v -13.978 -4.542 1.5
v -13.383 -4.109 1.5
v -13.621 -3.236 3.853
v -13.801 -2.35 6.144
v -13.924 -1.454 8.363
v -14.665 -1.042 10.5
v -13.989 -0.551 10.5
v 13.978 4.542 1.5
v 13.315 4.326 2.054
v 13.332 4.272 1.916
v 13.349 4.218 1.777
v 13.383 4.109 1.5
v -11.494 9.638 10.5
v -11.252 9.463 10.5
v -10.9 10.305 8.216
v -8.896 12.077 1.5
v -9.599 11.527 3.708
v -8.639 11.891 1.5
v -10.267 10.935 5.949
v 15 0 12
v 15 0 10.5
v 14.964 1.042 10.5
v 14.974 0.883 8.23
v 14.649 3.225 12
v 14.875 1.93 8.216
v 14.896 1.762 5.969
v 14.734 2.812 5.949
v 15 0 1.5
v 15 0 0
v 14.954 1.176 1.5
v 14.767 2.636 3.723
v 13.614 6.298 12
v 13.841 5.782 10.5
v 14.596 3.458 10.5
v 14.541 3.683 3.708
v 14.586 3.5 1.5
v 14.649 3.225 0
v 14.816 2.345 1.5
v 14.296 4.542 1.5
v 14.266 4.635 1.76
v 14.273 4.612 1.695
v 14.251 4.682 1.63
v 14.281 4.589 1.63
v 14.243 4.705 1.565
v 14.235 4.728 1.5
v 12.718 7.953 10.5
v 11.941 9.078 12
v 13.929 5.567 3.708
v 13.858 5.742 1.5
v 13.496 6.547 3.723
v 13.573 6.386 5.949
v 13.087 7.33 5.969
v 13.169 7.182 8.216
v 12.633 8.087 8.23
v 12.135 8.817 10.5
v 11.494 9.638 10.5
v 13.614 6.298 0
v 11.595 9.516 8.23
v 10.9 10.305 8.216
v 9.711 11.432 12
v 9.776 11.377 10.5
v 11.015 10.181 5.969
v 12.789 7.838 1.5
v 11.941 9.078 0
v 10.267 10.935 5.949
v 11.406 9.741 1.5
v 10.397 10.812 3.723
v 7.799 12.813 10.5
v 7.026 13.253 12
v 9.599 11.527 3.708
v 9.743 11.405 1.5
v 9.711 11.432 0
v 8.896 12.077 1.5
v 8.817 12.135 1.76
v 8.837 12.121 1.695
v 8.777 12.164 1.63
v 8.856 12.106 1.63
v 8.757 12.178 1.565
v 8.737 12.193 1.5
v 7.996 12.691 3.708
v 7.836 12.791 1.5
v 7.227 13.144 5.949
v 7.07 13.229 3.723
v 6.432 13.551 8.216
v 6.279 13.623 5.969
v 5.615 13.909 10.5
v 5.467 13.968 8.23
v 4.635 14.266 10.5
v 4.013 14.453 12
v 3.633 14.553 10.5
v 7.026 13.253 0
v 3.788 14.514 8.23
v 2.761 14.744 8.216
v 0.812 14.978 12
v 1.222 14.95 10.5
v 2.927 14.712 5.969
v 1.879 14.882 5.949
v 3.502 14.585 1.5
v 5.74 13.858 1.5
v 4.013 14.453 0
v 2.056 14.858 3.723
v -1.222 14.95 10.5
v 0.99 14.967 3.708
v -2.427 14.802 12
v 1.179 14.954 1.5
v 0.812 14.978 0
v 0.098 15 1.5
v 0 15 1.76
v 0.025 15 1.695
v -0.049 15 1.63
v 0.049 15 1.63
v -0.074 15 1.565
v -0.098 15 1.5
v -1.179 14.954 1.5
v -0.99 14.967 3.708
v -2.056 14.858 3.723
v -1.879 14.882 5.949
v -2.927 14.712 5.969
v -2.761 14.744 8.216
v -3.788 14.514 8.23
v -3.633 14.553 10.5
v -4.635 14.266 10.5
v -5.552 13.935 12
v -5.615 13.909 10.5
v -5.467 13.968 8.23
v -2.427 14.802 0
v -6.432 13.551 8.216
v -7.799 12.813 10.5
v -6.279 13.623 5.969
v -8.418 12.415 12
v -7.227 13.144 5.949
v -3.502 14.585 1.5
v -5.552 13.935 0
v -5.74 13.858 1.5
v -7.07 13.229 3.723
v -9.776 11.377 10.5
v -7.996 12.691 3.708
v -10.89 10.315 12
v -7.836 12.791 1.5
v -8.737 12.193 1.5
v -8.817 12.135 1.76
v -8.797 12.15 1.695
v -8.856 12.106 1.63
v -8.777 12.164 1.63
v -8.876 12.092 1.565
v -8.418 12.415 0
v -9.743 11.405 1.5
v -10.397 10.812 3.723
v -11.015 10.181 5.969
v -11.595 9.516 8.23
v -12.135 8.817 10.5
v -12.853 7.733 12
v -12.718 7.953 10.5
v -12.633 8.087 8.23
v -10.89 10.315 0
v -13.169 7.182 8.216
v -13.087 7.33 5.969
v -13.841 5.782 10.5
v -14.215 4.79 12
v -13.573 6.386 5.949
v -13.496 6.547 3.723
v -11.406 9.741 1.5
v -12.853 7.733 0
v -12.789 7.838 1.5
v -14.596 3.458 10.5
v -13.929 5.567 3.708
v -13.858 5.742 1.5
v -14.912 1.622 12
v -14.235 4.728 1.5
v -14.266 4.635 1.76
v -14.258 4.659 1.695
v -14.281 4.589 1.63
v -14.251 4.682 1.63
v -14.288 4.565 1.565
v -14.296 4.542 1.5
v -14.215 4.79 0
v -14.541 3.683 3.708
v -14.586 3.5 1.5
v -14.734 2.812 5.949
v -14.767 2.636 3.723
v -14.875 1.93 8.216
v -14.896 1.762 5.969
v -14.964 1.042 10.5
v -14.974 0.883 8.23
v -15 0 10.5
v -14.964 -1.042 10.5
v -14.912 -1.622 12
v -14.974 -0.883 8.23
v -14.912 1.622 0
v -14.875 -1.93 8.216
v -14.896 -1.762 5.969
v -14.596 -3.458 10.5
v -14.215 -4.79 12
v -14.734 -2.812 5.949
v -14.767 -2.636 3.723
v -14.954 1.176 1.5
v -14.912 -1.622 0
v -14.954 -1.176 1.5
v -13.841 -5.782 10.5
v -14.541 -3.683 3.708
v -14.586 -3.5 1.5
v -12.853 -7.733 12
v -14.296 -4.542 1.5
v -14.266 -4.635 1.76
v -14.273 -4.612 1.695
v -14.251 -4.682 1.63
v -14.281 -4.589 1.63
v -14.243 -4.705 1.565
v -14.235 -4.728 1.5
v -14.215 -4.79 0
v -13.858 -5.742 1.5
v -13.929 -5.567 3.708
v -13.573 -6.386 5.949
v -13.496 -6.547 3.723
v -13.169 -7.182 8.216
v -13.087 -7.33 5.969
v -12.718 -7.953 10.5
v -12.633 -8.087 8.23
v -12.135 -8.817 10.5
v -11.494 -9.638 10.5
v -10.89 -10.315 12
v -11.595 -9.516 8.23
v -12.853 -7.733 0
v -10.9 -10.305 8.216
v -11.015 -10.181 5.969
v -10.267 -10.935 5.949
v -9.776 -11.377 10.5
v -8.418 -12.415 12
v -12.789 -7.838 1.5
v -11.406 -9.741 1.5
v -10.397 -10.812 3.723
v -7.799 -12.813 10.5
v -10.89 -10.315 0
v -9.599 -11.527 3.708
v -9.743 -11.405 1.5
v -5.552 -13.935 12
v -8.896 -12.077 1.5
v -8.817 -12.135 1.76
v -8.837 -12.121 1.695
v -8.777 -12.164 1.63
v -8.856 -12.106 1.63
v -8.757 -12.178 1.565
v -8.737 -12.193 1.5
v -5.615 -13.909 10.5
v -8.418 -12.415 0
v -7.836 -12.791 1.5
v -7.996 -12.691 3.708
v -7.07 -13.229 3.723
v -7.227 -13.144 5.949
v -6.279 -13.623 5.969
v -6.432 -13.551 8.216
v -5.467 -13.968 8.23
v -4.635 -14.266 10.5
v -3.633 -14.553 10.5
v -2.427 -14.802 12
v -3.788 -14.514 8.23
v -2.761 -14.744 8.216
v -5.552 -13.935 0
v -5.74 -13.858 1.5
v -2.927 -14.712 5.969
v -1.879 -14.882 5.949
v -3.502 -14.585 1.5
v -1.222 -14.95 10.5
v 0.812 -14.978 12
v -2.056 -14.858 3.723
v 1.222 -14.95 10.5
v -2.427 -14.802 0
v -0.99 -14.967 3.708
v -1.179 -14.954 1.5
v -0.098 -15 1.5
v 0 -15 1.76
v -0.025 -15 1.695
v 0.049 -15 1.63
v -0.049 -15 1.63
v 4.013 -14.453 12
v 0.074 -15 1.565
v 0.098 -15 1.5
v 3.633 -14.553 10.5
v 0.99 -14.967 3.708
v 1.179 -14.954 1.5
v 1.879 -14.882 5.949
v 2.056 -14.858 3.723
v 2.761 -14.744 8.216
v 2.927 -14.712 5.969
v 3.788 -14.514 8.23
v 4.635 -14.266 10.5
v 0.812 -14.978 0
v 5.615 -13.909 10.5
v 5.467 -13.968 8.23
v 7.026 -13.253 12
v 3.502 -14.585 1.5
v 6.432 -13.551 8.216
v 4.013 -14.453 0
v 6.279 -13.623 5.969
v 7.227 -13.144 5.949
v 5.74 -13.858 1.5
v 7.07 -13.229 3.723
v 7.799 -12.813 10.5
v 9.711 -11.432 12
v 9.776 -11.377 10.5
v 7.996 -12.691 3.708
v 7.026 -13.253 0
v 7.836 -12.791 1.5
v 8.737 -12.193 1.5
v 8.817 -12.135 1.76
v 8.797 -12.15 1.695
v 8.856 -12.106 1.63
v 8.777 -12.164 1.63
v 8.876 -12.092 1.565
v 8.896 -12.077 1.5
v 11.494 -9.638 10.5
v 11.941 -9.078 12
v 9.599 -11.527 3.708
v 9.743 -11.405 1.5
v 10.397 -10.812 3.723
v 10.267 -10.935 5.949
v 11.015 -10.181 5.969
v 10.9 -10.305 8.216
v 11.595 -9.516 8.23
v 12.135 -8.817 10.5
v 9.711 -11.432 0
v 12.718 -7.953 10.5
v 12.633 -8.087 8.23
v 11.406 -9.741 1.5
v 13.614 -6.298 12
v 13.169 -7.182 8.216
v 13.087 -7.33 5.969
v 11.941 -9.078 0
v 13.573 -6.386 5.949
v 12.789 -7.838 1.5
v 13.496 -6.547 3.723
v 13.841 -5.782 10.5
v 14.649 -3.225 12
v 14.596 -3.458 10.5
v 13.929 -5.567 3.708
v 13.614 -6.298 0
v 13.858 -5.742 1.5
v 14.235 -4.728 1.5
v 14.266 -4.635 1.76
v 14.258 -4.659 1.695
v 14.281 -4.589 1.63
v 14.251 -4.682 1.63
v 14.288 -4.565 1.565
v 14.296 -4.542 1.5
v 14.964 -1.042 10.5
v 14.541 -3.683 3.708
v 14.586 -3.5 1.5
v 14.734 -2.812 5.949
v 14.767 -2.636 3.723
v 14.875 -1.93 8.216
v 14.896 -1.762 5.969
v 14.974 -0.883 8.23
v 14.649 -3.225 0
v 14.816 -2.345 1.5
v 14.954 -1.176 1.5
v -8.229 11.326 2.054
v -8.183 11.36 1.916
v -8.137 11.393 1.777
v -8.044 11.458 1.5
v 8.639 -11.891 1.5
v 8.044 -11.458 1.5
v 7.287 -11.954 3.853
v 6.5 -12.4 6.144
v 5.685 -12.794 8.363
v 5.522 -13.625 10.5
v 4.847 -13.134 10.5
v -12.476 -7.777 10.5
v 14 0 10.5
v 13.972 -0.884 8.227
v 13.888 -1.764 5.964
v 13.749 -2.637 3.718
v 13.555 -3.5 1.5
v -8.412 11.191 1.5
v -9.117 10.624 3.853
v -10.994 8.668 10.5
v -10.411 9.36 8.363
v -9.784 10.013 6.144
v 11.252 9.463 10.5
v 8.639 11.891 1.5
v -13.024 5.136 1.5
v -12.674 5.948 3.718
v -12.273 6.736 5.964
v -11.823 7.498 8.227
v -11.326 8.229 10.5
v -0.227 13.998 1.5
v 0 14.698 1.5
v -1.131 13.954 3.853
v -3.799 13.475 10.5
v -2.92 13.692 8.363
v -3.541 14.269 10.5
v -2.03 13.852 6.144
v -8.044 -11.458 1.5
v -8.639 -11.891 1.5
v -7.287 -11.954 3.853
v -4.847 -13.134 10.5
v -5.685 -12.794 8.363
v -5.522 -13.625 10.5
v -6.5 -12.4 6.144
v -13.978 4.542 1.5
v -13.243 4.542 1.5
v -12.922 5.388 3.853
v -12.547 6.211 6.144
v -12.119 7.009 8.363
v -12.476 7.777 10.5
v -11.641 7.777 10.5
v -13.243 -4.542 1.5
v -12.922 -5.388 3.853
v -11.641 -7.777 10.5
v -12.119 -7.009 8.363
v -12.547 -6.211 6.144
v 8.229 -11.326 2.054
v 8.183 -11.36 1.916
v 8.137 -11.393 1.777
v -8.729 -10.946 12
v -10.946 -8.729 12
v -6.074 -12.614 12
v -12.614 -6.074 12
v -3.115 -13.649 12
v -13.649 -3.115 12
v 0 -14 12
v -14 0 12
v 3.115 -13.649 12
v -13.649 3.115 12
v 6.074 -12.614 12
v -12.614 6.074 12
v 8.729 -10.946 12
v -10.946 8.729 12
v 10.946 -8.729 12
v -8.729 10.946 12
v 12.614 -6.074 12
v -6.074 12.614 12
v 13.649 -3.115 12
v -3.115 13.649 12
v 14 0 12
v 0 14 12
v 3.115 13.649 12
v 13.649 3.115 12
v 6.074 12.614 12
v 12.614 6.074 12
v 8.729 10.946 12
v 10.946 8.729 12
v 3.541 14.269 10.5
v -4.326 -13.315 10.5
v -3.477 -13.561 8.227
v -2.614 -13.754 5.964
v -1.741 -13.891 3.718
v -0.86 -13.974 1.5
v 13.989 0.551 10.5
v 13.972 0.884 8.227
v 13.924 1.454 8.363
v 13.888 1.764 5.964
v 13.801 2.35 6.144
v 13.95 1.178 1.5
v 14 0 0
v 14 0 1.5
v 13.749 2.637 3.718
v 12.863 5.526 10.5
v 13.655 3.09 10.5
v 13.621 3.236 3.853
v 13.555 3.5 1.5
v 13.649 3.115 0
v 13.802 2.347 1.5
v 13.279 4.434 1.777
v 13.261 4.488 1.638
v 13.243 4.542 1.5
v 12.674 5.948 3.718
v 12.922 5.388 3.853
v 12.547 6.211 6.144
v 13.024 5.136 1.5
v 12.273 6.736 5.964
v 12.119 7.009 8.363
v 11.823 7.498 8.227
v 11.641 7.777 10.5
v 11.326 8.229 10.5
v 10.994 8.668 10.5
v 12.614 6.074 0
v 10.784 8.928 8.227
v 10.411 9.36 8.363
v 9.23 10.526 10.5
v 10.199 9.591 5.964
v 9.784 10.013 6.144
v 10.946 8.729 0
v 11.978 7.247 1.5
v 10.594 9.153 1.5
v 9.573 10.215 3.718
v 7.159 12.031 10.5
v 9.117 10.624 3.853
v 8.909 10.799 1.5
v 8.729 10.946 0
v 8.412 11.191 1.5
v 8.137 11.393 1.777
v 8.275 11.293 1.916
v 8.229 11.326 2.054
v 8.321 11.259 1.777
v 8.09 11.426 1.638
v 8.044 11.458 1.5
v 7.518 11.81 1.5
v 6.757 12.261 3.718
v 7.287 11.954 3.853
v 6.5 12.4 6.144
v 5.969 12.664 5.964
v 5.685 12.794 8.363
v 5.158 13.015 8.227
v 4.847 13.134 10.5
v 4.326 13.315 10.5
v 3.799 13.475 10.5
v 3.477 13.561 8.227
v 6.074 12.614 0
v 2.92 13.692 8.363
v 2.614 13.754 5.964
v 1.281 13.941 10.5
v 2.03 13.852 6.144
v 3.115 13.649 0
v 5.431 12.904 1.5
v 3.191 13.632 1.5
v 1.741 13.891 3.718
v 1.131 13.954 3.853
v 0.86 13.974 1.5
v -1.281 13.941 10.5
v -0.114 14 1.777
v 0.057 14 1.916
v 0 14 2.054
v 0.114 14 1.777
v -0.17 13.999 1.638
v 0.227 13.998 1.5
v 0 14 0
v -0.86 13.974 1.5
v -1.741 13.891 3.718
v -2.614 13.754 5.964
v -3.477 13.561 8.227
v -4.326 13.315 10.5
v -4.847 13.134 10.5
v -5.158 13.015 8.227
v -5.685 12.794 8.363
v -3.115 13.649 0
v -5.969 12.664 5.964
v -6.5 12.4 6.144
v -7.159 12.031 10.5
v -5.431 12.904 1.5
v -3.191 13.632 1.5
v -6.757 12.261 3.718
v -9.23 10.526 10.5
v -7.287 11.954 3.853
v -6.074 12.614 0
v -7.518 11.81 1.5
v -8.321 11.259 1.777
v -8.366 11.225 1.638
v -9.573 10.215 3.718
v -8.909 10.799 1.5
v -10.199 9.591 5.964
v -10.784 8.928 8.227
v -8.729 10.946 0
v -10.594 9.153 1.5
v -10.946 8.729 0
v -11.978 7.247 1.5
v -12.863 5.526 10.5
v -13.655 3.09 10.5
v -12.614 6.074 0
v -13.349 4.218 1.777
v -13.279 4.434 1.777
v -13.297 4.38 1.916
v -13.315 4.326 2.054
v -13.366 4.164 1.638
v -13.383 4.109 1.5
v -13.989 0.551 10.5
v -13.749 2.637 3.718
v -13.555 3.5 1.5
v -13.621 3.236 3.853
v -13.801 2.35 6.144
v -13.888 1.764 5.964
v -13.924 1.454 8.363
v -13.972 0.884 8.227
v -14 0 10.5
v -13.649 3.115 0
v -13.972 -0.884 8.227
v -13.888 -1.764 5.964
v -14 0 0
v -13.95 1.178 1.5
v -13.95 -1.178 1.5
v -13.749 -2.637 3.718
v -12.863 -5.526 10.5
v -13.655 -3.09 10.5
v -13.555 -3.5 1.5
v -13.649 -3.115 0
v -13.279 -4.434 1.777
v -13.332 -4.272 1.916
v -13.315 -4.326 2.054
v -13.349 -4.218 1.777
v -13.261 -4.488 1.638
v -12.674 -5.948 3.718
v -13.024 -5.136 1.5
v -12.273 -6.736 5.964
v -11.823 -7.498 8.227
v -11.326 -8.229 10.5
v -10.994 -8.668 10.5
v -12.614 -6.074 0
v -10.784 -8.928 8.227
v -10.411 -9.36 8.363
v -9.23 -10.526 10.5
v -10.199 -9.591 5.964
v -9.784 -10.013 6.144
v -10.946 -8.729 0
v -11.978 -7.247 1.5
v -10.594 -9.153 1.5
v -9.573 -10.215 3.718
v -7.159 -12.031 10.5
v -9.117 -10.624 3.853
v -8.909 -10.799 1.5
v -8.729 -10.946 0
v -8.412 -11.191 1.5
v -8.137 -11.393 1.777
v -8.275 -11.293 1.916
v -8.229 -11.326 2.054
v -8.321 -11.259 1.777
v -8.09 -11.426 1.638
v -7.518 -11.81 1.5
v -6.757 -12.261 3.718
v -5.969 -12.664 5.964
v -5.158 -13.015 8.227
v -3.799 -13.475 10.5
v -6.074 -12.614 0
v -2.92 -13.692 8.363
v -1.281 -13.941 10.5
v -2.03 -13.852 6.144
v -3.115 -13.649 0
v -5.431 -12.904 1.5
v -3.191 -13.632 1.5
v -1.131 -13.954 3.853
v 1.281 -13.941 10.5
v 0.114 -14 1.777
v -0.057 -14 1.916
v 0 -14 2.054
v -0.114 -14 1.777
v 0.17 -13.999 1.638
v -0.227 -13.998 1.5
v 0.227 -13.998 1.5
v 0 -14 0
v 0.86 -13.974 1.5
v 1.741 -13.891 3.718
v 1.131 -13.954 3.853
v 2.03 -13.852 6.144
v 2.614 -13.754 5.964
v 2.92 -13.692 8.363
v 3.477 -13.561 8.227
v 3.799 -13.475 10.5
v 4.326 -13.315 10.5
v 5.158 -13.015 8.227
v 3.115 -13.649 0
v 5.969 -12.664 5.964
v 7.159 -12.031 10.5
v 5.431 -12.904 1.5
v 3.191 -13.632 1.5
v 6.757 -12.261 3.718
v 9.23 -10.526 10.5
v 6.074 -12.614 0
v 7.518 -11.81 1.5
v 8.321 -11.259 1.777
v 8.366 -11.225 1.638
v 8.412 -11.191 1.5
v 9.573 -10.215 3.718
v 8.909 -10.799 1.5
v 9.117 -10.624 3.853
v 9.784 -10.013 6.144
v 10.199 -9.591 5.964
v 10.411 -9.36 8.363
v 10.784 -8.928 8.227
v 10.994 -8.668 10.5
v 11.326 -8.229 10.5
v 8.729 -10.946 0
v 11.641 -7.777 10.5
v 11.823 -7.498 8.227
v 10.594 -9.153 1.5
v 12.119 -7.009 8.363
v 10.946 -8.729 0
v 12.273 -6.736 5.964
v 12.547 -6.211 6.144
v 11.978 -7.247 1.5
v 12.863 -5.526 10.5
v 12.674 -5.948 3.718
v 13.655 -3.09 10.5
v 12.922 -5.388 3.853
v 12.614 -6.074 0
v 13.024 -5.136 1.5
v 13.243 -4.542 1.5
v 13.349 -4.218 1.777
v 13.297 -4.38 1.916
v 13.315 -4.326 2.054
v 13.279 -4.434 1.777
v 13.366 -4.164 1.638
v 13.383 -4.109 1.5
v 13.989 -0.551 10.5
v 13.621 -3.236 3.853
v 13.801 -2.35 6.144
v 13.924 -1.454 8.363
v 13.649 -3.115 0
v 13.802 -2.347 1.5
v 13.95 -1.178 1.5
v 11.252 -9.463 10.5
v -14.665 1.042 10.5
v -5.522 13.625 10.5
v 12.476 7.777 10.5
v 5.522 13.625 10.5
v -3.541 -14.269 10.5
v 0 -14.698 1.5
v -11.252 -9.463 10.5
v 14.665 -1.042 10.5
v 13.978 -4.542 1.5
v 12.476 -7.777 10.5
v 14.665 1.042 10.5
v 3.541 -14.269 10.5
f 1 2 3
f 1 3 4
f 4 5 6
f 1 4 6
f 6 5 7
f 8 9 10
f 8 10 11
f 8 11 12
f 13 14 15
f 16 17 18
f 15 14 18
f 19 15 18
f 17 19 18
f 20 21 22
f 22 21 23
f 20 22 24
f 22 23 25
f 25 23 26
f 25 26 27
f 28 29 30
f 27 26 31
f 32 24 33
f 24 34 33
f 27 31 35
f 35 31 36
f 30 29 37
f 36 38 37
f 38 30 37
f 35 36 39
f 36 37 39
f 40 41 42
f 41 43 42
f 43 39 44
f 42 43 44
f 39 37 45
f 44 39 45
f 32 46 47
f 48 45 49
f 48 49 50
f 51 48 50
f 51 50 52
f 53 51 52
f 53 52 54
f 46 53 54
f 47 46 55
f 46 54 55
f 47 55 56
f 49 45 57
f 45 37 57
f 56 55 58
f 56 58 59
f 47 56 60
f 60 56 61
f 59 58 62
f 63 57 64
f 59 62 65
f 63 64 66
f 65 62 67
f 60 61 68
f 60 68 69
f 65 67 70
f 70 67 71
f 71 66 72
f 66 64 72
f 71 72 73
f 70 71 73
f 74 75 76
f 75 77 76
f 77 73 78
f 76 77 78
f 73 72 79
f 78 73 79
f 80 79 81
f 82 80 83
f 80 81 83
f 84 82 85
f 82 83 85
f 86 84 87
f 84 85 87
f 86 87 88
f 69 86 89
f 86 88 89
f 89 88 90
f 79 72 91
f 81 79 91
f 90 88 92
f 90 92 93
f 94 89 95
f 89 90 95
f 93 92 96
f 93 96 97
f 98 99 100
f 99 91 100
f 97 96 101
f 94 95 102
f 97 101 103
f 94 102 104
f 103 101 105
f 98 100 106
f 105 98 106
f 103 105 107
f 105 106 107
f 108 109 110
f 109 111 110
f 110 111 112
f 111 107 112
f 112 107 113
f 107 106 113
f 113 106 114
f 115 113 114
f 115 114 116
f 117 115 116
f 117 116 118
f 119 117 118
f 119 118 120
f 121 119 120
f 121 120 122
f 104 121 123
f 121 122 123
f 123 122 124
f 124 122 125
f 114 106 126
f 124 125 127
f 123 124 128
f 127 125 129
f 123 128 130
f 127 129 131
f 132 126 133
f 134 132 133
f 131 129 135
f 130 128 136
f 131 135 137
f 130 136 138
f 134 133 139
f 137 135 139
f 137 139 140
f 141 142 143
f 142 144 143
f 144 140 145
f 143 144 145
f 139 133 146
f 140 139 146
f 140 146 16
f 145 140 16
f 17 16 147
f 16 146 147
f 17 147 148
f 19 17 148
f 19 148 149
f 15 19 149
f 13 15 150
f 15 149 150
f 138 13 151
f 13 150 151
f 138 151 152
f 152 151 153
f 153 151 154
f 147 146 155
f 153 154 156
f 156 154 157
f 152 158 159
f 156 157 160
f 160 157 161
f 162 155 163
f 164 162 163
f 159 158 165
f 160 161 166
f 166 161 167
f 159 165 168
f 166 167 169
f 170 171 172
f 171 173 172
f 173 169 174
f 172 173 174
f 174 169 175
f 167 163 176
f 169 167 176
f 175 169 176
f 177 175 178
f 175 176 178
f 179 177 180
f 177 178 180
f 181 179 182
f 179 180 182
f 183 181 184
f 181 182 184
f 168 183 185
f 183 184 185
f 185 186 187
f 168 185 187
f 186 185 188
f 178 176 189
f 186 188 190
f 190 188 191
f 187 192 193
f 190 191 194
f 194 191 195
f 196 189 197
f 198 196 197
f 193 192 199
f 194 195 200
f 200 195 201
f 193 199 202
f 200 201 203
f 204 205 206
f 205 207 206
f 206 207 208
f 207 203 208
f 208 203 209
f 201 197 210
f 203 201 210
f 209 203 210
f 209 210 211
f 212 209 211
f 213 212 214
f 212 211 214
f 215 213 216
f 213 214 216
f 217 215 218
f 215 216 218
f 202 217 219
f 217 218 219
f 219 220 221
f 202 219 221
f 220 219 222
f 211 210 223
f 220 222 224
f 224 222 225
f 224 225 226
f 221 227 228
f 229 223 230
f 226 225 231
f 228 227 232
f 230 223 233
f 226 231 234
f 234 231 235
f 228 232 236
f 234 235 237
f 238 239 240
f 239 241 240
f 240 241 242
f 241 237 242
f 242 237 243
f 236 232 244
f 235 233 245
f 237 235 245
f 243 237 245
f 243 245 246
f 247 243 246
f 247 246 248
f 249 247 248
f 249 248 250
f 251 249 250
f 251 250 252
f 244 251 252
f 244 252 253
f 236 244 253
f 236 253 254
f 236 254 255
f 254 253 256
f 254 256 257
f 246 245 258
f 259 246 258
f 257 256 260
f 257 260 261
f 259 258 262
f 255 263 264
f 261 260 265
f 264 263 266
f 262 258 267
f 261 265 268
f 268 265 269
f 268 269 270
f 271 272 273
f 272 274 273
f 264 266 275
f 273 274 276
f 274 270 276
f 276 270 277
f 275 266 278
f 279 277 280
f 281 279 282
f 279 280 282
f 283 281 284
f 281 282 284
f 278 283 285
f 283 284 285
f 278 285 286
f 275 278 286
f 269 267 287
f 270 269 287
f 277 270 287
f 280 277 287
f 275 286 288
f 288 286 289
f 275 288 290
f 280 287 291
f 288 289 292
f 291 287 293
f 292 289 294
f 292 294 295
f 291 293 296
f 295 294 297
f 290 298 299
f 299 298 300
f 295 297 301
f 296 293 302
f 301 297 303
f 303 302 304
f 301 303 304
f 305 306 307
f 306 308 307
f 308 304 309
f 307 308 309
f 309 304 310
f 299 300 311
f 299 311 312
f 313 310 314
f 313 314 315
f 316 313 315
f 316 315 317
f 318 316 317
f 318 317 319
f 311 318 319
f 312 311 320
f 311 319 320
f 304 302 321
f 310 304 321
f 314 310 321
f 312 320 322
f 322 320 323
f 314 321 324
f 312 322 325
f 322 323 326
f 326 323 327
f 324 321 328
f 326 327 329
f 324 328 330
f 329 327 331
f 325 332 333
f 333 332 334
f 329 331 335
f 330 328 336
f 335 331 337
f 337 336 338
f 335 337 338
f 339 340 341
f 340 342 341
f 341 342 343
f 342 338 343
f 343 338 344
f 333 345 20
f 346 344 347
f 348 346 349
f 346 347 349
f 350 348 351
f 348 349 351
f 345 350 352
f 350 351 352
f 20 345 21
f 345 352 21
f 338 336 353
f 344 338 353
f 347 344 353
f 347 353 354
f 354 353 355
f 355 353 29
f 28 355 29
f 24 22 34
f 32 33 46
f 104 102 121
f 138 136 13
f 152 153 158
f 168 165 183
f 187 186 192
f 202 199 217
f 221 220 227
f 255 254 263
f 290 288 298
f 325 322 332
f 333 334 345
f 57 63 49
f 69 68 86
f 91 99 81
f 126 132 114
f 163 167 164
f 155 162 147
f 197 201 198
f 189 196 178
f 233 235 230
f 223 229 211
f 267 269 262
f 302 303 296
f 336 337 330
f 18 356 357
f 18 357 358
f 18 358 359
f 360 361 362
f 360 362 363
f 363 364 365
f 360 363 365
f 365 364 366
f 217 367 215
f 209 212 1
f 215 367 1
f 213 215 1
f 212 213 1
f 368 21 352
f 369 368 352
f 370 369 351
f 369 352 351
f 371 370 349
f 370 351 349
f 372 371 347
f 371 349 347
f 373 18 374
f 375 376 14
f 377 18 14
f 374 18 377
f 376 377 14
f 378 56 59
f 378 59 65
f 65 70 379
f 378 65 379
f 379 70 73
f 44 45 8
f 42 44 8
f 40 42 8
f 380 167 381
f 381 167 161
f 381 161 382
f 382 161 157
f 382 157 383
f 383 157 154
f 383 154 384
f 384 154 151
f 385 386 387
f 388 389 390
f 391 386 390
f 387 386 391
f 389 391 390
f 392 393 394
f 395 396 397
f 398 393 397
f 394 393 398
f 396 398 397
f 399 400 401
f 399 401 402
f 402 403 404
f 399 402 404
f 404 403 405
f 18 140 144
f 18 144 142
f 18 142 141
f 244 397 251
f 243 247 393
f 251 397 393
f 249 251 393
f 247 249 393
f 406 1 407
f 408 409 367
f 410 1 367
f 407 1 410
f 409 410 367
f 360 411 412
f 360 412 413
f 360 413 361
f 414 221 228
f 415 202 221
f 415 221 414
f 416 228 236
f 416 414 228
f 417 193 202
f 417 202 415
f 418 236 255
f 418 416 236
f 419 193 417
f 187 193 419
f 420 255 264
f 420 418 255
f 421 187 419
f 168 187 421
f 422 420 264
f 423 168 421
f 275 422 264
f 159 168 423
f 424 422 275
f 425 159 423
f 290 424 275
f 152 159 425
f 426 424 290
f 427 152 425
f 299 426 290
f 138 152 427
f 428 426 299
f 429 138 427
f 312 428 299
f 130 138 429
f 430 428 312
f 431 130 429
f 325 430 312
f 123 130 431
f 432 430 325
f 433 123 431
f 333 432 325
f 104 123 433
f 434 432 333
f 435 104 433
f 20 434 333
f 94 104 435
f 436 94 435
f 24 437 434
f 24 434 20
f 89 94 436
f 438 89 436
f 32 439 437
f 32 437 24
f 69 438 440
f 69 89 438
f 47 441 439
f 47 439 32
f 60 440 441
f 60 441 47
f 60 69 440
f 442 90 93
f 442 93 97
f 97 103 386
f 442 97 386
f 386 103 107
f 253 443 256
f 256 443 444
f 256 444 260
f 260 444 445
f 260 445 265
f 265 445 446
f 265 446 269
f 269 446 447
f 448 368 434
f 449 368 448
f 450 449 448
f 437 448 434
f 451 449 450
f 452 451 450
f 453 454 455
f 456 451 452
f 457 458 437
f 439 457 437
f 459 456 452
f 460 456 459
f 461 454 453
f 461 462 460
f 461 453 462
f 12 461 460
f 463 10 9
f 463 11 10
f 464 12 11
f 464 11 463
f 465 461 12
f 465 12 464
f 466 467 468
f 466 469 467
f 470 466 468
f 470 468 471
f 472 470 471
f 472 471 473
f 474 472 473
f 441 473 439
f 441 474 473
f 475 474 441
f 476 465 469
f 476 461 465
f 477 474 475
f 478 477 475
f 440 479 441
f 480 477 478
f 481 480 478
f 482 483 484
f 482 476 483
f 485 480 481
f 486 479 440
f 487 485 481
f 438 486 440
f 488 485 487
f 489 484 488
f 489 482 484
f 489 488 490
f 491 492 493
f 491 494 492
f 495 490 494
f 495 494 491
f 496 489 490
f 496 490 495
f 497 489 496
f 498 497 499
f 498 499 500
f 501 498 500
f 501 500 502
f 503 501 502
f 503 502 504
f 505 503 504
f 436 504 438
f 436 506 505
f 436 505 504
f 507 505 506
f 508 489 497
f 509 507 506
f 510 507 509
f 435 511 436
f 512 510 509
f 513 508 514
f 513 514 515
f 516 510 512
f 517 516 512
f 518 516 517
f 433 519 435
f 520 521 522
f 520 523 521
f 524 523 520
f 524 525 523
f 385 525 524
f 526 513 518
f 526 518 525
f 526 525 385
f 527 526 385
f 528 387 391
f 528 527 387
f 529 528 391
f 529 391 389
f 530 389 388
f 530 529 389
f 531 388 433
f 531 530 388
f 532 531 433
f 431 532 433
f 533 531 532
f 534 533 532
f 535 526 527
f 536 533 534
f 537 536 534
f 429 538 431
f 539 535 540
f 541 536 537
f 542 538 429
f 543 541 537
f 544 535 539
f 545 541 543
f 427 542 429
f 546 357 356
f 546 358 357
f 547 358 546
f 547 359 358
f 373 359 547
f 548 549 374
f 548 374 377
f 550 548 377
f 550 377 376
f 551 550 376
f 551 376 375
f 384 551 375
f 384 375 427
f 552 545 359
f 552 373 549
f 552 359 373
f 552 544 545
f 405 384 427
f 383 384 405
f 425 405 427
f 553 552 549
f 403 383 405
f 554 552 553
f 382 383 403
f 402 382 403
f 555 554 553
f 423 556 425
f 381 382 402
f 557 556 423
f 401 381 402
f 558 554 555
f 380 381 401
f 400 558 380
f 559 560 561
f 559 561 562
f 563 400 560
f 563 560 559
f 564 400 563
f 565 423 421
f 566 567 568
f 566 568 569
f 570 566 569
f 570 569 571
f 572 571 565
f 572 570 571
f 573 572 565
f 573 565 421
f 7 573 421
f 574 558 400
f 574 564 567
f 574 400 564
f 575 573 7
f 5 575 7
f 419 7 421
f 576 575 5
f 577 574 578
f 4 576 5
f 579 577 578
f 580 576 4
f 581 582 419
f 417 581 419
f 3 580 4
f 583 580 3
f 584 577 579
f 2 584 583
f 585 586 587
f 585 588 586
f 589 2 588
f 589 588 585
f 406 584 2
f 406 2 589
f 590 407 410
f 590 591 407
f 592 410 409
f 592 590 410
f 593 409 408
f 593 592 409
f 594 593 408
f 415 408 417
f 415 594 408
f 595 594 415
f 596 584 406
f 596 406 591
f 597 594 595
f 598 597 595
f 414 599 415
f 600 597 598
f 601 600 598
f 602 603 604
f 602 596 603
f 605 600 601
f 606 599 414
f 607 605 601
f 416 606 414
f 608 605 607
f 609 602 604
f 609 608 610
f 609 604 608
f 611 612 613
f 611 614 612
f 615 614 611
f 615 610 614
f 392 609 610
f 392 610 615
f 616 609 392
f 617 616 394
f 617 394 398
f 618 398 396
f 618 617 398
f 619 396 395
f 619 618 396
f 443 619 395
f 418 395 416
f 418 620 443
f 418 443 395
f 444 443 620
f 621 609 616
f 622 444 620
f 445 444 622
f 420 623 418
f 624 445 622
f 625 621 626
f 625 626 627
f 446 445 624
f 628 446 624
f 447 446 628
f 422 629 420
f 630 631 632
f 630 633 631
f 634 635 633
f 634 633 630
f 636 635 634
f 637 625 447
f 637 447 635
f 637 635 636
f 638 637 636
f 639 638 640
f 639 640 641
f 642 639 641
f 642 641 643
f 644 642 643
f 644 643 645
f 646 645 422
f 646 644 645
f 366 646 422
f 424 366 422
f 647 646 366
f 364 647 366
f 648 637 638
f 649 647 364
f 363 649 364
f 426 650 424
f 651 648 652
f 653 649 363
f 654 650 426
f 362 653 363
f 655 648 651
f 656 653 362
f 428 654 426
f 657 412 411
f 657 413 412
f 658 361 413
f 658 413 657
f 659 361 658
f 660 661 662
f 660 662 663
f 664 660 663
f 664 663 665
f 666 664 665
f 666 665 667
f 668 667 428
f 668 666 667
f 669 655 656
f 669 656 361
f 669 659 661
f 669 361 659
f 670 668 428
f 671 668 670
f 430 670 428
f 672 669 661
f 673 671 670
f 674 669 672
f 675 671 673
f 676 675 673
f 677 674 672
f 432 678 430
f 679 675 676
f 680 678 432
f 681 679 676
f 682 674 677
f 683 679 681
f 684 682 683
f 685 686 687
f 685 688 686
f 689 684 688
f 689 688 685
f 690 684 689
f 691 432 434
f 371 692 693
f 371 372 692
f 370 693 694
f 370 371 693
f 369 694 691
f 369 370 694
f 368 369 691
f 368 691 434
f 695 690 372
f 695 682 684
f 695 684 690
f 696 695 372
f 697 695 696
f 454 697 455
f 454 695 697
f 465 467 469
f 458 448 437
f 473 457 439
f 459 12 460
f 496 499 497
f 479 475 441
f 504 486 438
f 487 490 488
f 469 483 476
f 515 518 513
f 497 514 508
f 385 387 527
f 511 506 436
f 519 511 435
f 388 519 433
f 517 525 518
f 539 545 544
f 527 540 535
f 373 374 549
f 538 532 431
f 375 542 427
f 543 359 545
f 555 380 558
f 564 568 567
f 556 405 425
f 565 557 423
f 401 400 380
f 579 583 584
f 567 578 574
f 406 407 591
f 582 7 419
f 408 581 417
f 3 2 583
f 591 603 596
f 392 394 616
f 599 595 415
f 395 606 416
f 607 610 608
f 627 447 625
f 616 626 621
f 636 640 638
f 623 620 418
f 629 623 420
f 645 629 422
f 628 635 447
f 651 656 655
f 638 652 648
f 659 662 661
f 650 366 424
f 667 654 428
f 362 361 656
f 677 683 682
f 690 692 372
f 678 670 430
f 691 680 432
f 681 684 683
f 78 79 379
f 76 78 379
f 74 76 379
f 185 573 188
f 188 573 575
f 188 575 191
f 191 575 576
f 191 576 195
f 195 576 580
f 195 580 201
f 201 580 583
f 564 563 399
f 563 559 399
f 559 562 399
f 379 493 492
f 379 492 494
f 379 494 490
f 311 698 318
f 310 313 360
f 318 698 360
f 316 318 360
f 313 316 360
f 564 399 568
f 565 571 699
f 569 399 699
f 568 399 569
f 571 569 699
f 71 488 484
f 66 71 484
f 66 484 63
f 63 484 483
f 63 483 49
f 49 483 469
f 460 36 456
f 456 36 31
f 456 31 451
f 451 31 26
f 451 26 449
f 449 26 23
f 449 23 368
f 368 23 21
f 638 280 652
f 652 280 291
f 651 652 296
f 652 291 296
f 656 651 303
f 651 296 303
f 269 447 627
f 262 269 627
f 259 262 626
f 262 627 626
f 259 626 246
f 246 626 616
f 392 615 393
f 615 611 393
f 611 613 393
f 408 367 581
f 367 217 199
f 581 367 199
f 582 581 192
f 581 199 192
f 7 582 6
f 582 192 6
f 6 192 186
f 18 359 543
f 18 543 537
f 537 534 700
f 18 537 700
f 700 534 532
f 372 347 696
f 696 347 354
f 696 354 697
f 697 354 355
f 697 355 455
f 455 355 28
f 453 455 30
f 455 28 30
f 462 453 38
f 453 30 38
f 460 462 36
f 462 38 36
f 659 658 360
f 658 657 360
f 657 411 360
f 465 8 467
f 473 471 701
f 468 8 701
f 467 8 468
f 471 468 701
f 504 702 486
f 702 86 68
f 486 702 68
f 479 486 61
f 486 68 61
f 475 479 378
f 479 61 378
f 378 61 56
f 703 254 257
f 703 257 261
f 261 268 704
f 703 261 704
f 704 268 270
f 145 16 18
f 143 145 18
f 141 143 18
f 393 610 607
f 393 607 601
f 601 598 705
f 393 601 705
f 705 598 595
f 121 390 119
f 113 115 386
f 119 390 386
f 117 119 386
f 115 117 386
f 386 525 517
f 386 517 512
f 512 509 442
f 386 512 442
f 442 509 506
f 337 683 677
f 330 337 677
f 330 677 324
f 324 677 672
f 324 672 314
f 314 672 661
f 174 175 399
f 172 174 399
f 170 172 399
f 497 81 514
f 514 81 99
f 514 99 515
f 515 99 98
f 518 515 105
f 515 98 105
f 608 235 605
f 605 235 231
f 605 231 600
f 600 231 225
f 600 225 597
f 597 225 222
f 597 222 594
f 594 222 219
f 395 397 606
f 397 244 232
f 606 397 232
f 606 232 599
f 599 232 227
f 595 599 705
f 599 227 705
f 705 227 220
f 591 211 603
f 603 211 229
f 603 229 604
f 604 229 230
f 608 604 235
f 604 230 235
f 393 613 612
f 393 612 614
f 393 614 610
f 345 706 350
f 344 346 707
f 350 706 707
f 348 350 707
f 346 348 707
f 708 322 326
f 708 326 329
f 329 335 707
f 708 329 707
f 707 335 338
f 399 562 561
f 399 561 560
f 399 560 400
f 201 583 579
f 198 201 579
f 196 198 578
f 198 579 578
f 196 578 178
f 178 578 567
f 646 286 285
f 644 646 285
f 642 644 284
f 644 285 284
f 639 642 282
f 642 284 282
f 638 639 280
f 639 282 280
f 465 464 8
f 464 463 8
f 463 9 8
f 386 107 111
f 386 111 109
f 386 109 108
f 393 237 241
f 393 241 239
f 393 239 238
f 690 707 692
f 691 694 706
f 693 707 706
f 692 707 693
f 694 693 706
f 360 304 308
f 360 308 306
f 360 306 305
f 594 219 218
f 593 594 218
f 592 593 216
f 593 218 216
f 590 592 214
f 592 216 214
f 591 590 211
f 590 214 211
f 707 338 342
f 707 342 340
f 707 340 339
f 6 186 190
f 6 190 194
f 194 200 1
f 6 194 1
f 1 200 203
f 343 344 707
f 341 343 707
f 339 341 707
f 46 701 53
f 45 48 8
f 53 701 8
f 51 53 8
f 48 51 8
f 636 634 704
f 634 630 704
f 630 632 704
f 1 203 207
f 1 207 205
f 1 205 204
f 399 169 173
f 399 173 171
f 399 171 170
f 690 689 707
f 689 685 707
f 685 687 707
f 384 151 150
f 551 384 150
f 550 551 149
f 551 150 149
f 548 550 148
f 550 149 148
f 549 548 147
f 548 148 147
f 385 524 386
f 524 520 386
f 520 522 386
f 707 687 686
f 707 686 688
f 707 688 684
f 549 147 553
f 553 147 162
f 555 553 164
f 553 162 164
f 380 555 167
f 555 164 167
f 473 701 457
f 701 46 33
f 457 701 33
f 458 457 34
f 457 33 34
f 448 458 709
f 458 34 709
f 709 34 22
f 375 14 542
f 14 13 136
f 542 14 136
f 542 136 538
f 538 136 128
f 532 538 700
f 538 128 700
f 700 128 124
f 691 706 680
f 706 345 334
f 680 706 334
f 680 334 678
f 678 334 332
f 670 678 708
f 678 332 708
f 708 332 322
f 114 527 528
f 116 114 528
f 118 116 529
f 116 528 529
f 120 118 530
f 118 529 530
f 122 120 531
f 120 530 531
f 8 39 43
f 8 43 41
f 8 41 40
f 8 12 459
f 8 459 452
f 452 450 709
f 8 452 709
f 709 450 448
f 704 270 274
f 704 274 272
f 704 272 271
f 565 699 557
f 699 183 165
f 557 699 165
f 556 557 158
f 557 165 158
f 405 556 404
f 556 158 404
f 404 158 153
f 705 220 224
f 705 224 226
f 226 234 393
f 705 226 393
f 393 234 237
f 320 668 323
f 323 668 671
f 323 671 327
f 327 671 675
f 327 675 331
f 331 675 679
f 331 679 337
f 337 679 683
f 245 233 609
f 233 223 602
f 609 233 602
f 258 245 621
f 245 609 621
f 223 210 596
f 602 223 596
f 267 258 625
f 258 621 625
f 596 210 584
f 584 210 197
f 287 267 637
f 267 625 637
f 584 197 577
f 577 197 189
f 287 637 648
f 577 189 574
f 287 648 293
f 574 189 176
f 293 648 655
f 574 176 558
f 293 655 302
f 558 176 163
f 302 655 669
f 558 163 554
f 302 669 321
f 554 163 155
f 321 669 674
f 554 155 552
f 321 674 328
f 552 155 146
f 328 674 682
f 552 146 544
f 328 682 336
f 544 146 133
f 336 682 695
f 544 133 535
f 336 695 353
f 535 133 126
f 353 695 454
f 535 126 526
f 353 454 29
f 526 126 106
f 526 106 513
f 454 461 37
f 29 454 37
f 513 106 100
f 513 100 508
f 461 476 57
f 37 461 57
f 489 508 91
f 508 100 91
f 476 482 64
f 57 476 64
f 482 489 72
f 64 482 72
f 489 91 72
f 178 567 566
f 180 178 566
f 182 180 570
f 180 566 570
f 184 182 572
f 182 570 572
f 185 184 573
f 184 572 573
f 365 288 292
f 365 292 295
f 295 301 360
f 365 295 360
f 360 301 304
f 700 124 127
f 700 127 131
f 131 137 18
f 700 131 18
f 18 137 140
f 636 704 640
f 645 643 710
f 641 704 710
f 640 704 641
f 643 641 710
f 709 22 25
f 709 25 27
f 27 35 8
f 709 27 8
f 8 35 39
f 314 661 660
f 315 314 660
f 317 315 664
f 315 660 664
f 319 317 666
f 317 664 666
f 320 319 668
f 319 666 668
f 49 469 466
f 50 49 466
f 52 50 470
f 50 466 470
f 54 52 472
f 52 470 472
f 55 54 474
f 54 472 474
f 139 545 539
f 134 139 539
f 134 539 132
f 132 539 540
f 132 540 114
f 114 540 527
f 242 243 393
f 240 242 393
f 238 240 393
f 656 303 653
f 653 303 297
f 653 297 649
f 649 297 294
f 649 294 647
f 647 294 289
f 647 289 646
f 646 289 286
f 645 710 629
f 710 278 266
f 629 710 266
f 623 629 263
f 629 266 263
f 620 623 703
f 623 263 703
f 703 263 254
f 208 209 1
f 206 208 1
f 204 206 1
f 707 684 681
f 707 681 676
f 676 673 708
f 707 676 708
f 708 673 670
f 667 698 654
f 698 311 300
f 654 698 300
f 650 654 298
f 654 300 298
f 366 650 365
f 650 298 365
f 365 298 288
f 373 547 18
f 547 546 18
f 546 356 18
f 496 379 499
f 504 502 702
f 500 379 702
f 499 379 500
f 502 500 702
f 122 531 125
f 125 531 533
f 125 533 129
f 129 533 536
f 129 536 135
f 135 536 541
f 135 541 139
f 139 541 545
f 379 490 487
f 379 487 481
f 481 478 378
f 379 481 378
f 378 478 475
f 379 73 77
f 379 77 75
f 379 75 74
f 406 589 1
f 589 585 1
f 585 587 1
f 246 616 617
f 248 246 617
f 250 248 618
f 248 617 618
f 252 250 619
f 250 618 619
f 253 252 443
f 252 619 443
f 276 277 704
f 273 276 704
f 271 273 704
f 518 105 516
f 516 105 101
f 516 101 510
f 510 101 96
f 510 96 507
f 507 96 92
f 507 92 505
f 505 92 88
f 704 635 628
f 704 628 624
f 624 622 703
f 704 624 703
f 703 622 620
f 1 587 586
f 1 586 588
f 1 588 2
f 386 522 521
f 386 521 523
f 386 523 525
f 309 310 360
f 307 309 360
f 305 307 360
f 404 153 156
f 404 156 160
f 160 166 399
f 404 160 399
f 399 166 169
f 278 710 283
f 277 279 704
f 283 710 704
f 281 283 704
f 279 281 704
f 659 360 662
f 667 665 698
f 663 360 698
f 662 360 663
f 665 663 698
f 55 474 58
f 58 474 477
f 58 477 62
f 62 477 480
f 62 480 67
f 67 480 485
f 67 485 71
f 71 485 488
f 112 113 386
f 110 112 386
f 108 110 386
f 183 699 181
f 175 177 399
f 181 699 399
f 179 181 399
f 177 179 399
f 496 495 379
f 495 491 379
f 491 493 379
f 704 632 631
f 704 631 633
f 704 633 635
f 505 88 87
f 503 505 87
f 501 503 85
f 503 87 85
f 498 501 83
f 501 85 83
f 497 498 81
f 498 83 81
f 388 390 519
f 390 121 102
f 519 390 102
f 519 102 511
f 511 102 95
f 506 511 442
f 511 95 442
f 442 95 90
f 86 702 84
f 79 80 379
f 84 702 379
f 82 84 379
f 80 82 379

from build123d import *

# Parameters (mm, degrees)
SKETCH1_R           = 15
SKETCH1_R_2         = 14
BOSS_EXTRUDE1_DEPTH = 12
CUT_EXTRUDE1_DEPTH  = 31
CIRPATTERN1_COUNT   = 5
CUT_EXTRUDE2_DEPTH  = 32
CIRPATTERN2_COUNT   = 10


with BuildPart() as part:
    # Sketch1 → Boss-Extrude1 (new body)
    with BuildSketch(Plane.XY):
        Circle(SKETCH1_R)
        Circle(SKETCH1_R_2, mode=Mode.SUBTRACT)
    extrude(amount=BOSS_EXTRUDE1_DEPTH)

    # Sketch2 → Cut-Extrude1 (cut, symmetric)
    with BuildSketch(Plane(origin=(0, 0, 0), x_dir=(0, 0, -1), z_dir=(1, 0, 0))):
        Polygon((-1.5, 0), (-1.5, 3.5), (-10.5, 0), (-1.5, -3.5), align=None)
    cut_extrude1 = extrude(amount=CUT_EXTRUDE1_DEPTH, both=True, mode=Mode.SUBTRACT)

    # CirPattern1: Cut-Extrude1 ×5 about axis
    cirpattern1_axis = Axis((0, 0, 0), (0, 0, 1))
    for i in range(1, CIRPATTERN1_COUNT):
        add(cut_extrude1.rotate(cirpattern1_axis, i * 360 / CIRPATTERN1_COUNT), mode=Mode.SUBTRACT)

    # Sketch7 → Cut-Extrude2 (cut)
    with BuildSketch(Plane(origin=(-4.635254916, 14.265847744, 0), x_dir=(0.9510565162951501, 0.30901699437495833, 0), z_dir=(-0.30901699437495833, 0.9510565162951502, 0))):
        Polygon((-1.041848082, -10.5), (-4.541848082, -1.5), (-7.776778784, -10.5), align=None)
    cut_extrude2 = extrude(amount=-CUT_EXTRUDE2_DEPTH, mode=Mode.SUBTRACT)

    # CirPattern2: Cut-Extrude2 ×10 about axis
    cirpattern2_axis = Axis((0, 0, 0), (0, 0, 1))
    for i in range(1, CIRPATTERN2_COUNT):
        add(cut_extrude2.rotate(cirpattern2_axis, i * 360 / CIRPATTERN2_COUNT), mode=Mode.SUBTRACT)


solid = part.part
